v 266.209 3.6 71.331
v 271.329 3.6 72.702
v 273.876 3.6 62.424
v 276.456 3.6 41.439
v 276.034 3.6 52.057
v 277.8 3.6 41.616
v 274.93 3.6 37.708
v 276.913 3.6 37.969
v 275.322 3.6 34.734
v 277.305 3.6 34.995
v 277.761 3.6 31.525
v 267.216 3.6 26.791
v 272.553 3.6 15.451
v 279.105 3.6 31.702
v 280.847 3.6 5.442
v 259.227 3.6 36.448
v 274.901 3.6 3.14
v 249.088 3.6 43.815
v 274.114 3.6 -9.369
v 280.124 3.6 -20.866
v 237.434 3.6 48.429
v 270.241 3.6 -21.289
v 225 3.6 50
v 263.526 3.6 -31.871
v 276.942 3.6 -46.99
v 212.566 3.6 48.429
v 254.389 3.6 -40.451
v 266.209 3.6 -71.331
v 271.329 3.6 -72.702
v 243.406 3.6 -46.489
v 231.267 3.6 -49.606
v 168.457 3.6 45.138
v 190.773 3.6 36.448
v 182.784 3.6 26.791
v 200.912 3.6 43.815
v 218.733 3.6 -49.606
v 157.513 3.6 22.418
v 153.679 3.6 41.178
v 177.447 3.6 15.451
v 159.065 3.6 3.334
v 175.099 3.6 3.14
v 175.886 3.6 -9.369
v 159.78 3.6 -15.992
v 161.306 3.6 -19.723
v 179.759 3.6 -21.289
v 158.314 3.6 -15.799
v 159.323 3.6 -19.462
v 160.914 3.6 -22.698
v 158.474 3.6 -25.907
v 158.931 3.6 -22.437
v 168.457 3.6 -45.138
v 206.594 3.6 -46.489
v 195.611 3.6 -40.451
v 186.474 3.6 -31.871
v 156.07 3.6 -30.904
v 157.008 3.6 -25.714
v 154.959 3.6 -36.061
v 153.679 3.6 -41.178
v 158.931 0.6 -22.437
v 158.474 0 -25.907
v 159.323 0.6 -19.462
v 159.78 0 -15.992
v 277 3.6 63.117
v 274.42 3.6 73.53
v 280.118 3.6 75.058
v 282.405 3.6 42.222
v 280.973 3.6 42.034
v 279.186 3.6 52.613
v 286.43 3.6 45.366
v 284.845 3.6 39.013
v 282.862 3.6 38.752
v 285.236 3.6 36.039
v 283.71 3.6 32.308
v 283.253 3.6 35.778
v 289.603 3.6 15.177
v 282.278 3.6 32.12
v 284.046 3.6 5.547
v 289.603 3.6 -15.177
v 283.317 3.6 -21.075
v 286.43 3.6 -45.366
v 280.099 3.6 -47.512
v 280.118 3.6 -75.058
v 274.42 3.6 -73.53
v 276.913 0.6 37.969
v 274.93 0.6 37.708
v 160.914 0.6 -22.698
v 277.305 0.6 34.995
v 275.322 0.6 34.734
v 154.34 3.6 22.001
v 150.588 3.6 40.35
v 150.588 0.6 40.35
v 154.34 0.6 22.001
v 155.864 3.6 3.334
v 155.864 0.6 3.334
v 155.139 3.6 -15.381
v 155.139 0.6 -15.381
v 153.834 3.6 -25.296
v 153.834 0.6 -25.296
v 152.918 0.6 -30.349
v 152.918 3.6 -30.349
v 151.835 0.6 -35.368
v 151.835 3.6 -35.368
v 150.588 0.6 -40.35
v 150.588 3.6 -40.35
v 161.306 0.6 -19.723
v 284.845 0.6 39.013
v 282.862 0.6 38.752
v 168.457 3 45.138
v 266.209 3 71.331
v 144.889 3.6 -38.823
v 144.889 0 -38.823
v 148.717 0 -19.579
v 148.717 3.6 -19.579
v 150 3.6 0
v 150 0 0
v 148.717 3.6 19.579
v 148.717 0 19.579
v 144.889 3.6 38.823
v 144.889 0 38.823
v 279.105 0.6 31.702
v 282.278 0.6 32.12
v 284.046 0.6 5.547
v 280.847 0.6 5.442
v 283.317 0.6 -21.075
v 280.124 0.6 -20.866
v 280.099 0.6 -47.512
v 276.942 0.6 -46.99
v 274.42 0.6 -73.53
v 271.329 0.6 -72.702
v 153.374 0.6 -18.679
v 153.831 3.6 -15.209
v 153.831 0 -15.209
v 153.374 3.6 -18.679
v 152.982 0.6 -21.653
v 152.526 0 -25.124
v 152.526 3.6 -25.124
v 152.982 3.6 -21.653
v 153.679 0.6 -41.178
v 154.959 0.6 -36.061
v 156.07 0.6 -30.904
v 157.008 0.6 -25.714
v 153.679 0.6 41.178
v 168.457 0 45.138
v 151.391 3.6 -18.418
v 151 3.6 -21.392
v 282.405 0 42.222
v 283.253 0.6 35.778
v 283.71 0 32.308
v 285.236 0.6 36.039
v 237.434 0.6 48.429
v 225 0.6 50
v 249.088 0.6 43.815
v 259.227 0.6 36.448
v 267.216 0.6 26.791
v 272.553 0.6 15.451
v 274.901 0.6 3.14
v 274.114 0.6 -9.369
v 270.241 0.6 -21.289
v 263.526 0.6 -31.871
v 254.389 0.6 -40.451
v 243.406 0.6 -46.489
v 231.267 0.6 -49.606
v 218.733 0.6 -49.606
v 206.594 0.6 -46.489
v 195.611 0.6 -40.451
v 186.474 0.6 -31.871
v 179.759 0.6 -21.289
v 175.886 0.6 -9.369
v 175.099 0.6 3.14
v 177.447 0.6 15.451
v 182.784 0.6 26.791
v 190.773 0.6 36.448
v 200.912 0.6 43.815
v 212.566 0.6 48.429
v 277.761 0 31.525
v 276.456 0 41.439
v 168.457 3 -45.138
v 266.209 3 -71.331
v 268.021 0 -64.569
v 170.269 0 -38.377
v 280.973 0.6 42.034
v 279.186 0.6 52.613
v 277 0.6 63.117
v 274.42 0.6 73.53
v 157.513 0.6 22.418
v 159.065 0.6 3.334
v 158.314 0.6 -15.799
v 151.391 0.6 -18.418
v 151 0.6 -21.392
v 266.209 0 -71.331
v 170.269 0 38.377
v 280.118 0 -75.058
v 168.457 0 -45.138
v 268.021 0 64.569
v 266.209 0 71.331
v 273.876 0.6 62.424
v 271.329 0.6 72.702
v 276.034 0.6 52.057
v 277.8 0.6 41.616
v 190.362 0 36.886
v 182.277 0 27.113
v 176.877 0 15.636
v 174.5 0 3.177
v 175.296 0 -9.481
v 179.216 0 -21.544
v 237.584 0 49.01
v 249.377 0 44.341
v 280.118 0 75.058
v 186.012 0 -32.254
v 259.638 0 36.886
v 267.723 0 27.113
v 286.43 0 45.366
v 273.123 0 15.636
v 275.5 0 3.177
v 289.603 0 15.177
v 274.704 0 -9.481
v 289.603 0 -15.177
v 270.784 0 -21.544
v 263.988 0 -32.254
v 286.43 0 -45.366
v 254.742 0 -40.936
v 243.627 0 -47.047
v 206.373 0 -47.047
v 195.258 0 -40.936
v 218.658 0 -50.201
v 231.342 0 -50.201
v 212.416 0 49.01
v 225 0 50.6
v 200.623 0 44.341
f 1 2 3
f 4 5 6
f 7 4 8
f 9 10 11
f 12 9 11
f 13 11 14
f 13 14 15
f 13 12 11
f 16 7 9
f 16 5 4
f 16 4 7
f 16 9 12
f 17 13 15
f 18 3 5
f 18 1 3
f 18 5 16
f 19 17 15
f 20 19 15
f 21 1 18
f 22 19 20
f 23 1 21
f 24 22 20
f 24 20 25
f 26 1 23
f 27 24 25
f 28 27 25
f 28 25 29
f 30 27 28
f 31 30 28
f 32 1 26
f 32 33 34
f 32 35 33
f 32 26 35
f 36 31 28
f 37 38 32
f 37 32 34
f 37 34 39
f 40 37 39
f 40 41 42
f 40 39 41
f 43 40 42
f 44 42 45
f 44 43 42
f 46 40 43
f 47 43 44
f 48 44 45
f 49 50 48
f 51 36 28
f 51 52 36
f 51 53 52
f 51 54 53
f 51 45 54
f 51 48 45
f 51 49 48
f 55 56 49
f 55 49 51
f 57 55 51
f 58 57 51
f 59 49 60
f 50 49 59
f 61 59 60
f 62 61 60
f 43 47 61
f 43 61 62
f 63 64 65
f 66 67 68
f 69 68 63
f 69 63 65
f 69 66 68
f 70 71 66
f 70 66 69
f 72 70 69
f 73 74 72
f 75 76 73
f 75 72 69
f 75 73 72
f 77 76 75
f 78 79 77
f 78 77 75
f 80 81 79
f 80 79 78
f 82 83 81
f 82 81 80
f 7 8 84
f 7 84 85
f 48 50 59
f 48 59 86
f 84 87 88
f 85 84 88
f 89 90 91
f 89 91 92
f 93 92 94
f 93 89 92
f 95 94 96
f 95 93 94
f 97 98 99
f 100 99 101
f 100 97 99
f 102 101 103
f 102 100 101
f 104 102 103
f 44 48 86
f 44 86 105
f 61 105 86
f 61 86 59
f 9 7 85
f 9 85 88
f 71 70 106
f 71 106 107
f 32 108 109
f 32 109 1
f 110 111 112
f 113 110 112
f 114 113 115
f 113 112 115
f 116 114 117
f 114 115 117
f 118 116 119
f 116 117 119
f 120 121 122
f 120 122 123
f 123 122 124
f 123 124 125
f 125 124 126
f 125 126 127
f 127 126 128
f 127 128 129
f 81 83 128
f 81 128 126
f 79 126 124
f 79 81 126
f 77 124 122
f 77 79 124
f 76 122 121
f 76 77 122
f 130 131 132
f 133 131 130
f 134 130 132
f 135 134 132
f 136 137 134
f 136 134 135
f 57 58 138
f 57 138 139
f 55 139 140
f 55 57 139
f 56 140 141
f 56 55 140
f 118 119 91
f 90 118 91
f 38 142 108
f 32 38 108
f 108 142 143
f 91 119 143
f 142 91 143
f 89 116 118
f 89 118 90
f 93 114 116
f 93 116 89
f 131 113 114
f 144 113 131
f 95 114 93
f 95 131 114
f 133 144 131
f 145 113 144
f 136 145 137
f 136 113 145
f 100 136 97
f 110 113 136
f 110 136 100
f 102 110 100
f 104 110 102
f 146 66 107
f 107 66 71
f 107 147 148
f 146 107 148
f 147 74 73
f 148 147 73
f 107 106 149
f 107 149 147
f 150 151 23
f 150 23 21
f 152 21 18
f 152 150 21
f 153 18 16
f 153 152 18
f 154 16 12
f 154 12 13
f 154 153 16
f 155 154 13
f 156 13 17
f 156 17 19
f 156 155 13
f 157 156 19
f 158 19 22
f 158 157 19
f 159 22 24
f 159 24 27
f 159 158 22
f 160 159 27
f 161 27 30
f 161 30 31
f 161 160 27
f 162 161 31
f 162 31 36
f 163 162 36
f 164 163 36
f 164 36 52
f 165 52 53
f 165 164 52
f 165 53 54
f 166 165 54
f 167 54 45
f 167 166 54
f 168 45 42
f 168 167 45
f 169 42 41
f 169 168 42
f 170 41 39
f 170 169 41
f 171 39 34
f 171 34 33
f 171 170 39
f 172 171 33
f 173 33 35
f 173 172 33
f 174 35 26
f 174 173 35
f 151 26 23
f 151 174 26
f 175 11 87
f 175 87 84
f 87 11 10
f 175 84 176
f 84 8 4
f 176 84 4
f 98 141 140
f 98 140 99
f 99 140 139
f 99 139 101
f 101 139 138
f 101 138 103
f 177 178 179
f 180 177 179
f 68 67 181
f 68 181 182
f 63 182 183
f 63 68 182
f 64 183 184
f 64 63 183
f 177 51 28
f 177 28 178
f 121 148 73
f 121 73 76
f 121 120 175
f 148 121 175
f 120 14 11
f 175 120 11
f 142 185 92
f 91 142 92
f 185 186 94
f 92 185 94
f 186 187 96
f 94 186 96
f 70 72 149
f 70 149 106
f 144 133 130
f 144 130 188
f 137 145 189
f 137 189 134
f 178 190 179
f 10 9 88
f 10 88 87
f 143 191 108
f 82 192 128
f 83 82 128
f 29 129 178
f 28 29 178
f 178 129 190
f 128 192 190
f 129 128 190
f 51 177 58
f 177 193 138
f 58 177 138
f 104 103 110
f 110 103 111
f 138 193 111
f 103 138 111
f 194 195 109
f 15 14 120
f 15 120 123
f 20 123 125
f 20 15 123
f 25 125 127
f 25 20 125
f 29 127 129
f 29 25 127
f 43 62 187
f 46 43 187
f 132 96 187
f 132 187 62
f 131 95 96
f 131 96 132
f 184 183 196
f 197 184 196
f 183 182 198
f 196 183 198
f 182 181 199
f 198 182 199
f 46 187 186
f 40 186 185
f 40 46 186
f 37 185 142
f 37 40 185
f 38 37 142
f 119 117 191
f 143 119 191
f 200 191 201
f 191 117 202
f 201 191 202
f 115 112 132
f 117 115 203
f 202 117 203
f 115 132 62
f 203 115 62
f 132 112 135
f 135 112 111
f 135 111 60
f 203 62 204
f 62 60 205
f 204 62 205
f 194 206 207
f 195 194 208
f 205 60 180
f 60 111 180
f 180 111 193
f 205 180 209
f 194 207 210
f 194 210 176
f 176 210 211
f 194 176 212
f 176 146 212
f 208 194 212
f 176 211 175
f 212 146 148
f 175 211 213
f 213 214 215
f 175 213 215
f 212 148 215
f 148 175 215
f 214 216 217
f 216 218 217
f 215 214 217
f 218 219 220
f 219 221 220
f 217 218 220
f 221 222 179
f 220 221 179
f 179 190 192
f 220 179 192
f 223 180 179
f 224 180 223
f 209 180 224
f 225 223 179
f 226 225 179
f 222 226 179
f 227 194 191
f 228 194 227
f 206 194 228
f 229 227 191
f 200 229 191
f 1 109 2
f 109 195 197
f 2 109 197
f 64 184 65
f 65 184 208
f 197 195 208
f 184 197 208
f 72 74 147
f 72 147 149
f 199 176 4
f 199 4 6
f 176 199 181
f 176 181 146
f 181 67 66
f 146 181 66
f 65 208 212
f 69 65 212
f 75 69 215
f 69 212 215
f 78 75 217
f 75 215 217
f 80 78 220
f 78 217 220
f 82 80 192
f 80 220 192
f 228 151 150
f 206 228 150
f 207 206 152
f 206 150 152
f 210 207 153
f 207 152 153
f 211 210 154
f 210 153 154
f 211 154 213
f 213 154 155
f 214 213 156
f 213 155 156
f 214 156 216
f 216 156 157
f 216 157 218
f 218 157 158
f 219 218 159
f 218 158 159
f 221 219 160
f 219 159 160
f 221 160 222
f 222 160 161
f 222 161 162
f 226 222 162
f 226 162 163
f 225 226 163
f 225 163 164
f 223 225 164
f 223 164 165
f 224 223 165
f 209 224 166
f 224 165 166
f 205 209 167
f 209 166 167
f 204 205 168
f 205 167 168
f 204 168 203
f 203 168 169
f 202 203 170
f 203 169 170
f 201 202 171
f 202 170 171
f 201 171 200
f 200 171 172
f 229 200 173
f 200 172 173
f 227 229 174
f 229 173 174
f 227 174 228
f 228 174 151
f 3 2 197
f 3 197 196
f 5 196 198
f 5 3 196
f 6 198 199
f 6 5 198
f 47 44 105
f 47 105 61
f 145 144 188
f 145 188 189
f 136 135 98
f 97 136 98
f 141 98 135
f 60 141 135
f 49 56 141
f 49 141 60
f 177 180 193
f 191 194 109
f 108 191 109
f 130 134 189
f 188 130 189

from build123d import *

# Parameters (mm, degrees)
SKIZZE1_R                       = 50
AUFSATZ_LINEAR_AUSTRAGEN1_DEPTH = 3.6
SCHNITT_LINEAR_AUSTRAGEN1_DEPTH = 3
SCHNITT_LINEAR_AUSTRAGEN2_DEPTH = 300.577355237
SCHNITT_LINEAR_AUSTRAGEN3_DEPTH = 3
FASE1_SIZE                      = 0.6
SCHNITT_LINEAR_AUSTRAGEN4_DEPTH = 300.577355237
AUFSATZ_LINEAR_AUSTRAGEN4_DEPTH = 101.2
AUFSATZ_LINEAR_AUSTRAGEN5_DEPTH = 101.2


with BuildPart() as part:
    # Skizze1 → Aufsatz-Linear austragen1 (new body)
    with BuildSketch(Plane(origin=(0, 0, 0), x_dir=(1, 0, 0), z_dir=(0, 1, 0))):
        with BuildLine():
            Line((280.118489624, 75.05752308), (144.888873943, 38.822856765))
            ThreePointArc((144.888873943, 38.822856765), (150, 0), (144.888873943, -38.822856765))
            Line((144.888873943, -38.822856765), (280.118489624, -75.05752308))
            ThreePointArc((280.118489624, -75.05752308), (290, 0), (280.118489624, 75.05752308))
        make_face()
        with Locations(Location((225, 0, 0), (0, 0, 270))):
            Circle(SKIZZE1_R, mode=Mode.SUBTRACT)
    extrude(amount=AUFSATZ_LINEAR_AUSTRAGEN1_DEPTH)

    # Skizze2 → Schnitt-Linear austragen1 (cut)
    with BuildSketch(Plane(origin=(0, 3.6, 0), x_dir=(1, 0, 0), z_dir=(0, 1, 0))):
        with BuildLine():
            Line((150.587836318, 40.349889131), (153.678798963, 41.178110076))
            ThreePointArc((153.678798963, 41.178110076), (159.1, 0), (153.678798963, -41.178110076))
            Line((153.678798963, -41.178110076), (150.587836318, -40.349889131))
            ThreePointArc((150.587836318, -40.349889131), (155.9, 0), (150.587836318, 40.349889131))
        make_face()
        with BuildLine():
            Line((271.328564605, 72.702269769), (274.419527249, 73.530490714))
            ThreePointArc((274.419527249, 73.530490714), (284.1, 0), (274.419527249, -73.530490714))
            Line((274.419527249, -73.530490714), (271.328564605, -72.702269769))
            ThreePointArc((271.328564605, -72.702269769), (280.9, 0), (271.328564605, 72.702269769))
        make_face()
    extrude(amount=-SCHNITT_LINEAR_AUSTRAGEN1_DEPTH, mode=Mode.SUBTRACT)

    # Skizze3 → Schnitt-Linear austragen2 (cut, through all)
    with BuildSketch(Plane(origin=(0, 3.6, 0), x_dir=(1, 0, 0), z_dir=(0, 1, 0))):
        Polygon((152.525600121, 25.123521005), (158.474269289, 25.906678158), (159.779531212, 15.992229544), (153.830862043, 15.209072391), align=None)
        Polygon((276.456207793, -41.439295032), (282.404876961, -42.222452186), (283.710138883, -32.308003572), (277.761469715, -31.524846419), align=None)
    extrude(amount=-SCHNITT_LINEAR_AUSTRAGEN2_DEPTH, mode=Mode.SUBTRACT)

    # Skizze4 → Schnitt-Linear austragen3 (cut)
    with BuildSketch(Plane(origin=(0, 3.6, 0), x_dir=(1, 0, 0), z_dir=(0, 1, 0))):
        Polygon((150.999552071, 21.392411606), (160.914000685, 22.697673528), (161.305579262, 19.723338944), (151.391130648, 18.418077021), align=None)
        Polygon((275.32173832, -34.733851049), (285.236186933, -36.039112971), (284.844608357, -39.013447555), (274.930159743, -37.708185633), align=None)
    extrude(amount=-SCHNITT_LINEAR_AUSTRAGEN3_DEPTH, mode=Mode.SUBTRACT)

    # Fase1
    fase1_edges = [part.edges().sort_by_distance(p)[0] for p in [
        (225, 0, -50),
    ]]
    chamfer(fase1_edges, length=FASE1_SIZE)

    # Skizze5 → Schnitt-Linear austragen4 (cut, through all)
    with BuildSketch(Plane.XZ):
        Polygon((168.457464105, 45.138041466), (266.209157725, 71.33052883), (268.020891041, 64.569048046), (170.269197421, 38.376560682), align=None)
        Polygon((168.457464105, -45.138041466), (266.209157725, -71.33052883), (268.020891041, -64.569048046), (170.269197421, -38.376560682), align=None)
    extrude(amount=-SCHNITT_LINEAR_AUSTRAGEN4_DEPTH, mode=Mode.SUBTRACT)

    # Skizze6 → Aufsatz-Linear austragen4 (add)
    with BuildSketch(Plane(origin=(168.457464105, 0, 45.138041466), x_dir=(0.25881904510252185, 0, -0.965925826289068), z_dir=(0.9659258262890681, 0, 0.25881904510252185))):
        Polygon((0, 3.6), (7, 3.6), (7, 0), (0, 3), align=None)
    extrude(amount=AUFSATZ_LINEAR_AUSTRAGEN4_DEPTH)

    # Skizze7 → Aufsatz-Linear austragen5 (add)
    with BuildSketch(Plane(origin=(168.457464105, 0, -45.138041466), x_dir=(-0.2588190451025227, 0, -0.9659258262890678), z_dir=(0.9659258262890678, 0, -0.2588190451025227))):
        Polygon((-7, 0), (-7, 3.6), (0, 3.6), (0, 3), align=None)
    extrude(amount=AUFSATZ_LINEAR_AUSTRAGEN5_DEPTH)


solid = part.part
